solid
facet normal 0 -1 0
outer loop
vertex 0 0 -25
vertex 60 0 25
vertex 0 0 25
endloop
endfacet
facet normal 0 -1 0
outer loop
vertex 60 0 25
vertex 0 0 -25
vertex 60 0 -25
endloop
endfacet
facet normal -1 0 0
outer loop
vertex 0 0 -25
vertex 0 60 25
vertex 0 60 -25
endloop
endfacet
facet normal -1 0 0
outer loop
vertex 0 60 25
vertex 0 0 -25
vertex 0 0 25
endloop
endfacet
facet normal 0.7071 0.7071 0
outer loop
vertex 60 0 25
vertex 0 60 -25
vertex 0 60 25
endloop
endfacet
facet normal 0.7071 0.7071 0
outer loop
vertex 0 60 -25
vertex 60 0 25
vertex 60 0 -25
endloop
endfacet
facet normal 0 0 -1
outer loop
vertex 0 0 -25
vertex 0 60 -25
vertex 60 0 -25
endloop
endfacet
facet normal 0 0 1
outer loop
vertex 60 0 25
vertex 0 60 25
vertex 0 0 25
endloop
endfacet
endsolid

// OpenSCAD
// Unit of length: Unit.MM
polyhedron(points = [[0.0, 0.0, -25.0], [0.0, 0.0, 25.0], [60.0, 0.0, 25.0], [60.0, 0.0, -25.0], [0.0, 60.0, -25.0], [0.0, 60.0, 25.0]], faces = [[0, 1, 2, 3], [4, 5, 1, 0], [3, 2, 5, 4], [3, 4, 0], [1, 5, 2]]);
